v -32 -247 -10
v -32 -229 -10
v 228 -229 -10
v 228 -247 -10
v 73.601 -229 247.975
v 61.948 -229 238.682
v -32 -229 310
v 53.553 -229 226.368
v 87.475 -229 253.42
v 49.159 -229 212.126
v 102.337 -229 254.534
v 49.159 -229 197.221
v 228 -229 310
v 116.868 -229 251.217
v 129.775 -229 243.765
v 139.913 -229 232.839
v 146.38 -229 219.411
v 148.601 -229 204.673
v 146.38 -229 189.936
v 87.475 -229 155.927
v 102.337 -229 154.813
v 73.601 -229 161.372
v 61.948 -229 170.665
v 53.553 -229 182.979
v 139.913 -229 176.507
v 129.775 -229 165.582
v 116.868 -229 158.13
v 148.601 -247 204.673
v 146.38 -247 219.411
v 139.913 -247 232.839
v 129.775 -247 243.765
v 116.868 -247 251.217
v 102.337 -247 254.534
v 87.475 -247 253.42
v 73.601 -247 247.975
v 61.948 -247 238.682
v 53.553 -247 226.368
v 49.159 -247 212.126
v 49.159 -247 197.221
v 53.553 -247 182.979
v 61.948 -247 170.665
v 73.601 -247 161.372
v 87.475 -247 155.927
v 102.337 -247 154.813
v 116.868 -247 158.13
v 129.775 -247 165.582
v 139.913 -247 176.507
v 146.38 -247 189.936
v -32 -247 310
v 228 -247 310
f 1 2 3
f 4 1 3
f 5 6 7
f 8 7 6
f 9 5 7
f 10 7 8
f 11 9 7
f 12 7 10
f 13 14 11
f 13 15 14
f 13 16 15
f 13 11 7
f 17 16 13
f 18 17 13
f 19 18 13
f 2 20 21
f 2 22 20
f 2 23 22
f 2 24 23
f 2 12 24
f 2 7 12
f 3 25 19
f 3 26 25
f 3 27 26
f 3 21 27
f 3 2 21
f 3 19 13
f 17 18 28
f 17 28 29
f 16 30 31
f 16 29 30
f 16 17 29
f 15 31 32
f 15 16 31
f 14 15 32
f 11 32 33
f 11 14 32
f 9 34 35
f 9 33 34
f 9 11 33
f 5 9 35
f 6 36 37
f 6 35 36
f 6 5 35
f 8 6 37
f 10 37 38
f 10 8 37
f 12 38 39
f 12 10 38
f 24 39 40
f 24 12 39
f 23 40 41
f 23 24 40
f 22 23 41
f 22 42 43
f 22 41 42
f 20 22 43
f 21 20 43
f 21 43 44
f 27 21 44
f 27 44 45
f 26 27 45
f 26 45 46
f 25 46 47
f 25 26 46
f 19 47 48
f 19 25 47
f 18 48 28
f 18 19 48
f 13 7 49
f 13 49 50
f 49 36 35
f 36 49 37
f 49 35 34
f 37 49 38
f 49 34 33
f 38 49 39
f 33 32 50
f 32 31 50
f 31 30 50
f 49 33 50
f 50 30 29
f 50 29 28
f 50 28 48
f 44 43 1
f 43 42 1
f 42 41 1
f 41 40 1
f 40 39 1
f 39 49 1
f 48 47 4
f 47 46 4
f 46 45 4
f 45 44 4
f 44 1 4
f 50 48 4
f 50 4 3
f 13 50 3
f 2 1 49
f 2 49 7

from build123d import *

# Parameters (mm, degrees)
SKETCH011_R  = 50
PAD009_DEPTH = 40
BOX003_W     = 260
BOX003_H     = 18
BOX003_DEPTH = 320


with BuildPart() as body009:
    # Sketch011 → Pad009 (new body)
    with BuildSketch(Plane.XZ):
        with Locations((98.600952, 204.673477)):
            Circle(SKETCH011_R)
    extrude(amount=PAD009_DEPTH)


with BuildPart() as body009_1:
    # Body009 placement: moved
    add(body009.part.moved(Location((0, -212, 0))))


with BuildPart() as predni_strana:
    # Box003 → Box003 (new body)
    with BuildSketch(Plane(origin=(-32, -247, -10), x_dir=(1, 0, 0), z_dir=(0, 0, 1))):
        with Locations((130, 9)):
            Rectangle(BOX003_W, BOX003_H)
    extrude(amount=BOX003_DEPTH)

    # Cut003: cut Body009
    add(body009_1.part, mode=Mode.SUBTRACT)


solid = predni_strana.part
